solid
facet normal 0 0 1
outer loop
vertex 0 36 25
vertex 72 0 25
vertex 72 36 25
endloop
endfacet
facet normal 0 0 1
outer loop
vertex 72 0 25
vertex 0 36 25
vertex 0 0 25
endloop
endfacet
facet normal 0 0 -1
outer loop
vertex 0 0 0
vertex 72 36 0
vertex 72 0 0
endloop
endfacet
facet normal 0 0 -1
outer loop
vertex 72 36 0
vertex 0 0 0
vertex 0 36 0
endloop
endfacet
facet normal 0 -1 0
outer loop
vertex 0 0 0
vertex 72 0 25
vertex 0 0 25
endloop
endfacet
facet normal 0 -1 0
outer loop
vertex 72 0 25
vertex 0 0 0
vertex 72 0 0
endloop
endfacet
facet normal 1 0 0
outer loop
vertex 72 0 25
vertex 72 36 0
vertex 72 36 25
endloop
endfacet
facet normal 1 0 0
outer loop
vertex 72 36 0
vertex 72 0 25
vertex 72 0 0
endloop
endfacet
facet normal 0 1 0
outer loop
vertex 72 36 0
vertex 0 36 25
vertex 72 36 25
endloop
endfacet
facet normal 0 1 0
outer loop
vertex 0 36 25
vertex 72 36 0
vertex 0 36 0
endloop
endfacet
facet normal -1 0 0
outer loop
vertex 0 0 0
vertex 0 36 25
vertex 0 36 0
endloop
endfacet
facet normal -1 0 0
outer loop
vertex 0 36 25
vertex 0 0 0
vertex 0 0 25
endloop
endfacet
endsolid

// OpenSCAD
// file: lipos_h.scad
//
// QP_OpenSCAD_lib
//
// GNU GPL v3
// quackingplums@gmail.com
//
// Lipos - header definitions
//

// Lipo types
PolyPower_3S_1300_20C = ["Robotbirds Poly Power 3S 1300 20C",
	72, 36, 25];			// L, W, H
Zippy_Compact_3S_1000_25C = ["Zippy Compact 3S 1000 25C",
	76, 34, 15];
Zippy_Compact_3S_1300_25C = ["Zippy Compact 3S 1300 25C",
	76, 35, 19];
Zippy_Compact_3S_1500_25C = ["Zippy Compact 3S 1500 25C",
	106, 35, 14];

function lipo_name(lipo_type) = lipo_type[0];
function lipo_length(lipo_type) = lipo_type[1];
function lipo_width(lipo_type) = lipo_type[2];
function lipo_height(lipo_type) = lipo_type[3];
// main file
//
// QP_OpenSCAD_lib
//
// GNU GPL v3
// quackingplums@gmail.com
//
// Lipos
//

include <lipos_h.scad>;

$fn = 24;

ff = 0.05;	// fudge factor to prevent barfing on coincident faces

module lipo(lipo_type = PolyPower_3S_1300_20C)
{
	echo(lipo_name(lipo_type));
	cube([lipo_length(lipo_type), lipo_width(lipo_type), lipo_height(lipo_type)]);
}

lipo();
